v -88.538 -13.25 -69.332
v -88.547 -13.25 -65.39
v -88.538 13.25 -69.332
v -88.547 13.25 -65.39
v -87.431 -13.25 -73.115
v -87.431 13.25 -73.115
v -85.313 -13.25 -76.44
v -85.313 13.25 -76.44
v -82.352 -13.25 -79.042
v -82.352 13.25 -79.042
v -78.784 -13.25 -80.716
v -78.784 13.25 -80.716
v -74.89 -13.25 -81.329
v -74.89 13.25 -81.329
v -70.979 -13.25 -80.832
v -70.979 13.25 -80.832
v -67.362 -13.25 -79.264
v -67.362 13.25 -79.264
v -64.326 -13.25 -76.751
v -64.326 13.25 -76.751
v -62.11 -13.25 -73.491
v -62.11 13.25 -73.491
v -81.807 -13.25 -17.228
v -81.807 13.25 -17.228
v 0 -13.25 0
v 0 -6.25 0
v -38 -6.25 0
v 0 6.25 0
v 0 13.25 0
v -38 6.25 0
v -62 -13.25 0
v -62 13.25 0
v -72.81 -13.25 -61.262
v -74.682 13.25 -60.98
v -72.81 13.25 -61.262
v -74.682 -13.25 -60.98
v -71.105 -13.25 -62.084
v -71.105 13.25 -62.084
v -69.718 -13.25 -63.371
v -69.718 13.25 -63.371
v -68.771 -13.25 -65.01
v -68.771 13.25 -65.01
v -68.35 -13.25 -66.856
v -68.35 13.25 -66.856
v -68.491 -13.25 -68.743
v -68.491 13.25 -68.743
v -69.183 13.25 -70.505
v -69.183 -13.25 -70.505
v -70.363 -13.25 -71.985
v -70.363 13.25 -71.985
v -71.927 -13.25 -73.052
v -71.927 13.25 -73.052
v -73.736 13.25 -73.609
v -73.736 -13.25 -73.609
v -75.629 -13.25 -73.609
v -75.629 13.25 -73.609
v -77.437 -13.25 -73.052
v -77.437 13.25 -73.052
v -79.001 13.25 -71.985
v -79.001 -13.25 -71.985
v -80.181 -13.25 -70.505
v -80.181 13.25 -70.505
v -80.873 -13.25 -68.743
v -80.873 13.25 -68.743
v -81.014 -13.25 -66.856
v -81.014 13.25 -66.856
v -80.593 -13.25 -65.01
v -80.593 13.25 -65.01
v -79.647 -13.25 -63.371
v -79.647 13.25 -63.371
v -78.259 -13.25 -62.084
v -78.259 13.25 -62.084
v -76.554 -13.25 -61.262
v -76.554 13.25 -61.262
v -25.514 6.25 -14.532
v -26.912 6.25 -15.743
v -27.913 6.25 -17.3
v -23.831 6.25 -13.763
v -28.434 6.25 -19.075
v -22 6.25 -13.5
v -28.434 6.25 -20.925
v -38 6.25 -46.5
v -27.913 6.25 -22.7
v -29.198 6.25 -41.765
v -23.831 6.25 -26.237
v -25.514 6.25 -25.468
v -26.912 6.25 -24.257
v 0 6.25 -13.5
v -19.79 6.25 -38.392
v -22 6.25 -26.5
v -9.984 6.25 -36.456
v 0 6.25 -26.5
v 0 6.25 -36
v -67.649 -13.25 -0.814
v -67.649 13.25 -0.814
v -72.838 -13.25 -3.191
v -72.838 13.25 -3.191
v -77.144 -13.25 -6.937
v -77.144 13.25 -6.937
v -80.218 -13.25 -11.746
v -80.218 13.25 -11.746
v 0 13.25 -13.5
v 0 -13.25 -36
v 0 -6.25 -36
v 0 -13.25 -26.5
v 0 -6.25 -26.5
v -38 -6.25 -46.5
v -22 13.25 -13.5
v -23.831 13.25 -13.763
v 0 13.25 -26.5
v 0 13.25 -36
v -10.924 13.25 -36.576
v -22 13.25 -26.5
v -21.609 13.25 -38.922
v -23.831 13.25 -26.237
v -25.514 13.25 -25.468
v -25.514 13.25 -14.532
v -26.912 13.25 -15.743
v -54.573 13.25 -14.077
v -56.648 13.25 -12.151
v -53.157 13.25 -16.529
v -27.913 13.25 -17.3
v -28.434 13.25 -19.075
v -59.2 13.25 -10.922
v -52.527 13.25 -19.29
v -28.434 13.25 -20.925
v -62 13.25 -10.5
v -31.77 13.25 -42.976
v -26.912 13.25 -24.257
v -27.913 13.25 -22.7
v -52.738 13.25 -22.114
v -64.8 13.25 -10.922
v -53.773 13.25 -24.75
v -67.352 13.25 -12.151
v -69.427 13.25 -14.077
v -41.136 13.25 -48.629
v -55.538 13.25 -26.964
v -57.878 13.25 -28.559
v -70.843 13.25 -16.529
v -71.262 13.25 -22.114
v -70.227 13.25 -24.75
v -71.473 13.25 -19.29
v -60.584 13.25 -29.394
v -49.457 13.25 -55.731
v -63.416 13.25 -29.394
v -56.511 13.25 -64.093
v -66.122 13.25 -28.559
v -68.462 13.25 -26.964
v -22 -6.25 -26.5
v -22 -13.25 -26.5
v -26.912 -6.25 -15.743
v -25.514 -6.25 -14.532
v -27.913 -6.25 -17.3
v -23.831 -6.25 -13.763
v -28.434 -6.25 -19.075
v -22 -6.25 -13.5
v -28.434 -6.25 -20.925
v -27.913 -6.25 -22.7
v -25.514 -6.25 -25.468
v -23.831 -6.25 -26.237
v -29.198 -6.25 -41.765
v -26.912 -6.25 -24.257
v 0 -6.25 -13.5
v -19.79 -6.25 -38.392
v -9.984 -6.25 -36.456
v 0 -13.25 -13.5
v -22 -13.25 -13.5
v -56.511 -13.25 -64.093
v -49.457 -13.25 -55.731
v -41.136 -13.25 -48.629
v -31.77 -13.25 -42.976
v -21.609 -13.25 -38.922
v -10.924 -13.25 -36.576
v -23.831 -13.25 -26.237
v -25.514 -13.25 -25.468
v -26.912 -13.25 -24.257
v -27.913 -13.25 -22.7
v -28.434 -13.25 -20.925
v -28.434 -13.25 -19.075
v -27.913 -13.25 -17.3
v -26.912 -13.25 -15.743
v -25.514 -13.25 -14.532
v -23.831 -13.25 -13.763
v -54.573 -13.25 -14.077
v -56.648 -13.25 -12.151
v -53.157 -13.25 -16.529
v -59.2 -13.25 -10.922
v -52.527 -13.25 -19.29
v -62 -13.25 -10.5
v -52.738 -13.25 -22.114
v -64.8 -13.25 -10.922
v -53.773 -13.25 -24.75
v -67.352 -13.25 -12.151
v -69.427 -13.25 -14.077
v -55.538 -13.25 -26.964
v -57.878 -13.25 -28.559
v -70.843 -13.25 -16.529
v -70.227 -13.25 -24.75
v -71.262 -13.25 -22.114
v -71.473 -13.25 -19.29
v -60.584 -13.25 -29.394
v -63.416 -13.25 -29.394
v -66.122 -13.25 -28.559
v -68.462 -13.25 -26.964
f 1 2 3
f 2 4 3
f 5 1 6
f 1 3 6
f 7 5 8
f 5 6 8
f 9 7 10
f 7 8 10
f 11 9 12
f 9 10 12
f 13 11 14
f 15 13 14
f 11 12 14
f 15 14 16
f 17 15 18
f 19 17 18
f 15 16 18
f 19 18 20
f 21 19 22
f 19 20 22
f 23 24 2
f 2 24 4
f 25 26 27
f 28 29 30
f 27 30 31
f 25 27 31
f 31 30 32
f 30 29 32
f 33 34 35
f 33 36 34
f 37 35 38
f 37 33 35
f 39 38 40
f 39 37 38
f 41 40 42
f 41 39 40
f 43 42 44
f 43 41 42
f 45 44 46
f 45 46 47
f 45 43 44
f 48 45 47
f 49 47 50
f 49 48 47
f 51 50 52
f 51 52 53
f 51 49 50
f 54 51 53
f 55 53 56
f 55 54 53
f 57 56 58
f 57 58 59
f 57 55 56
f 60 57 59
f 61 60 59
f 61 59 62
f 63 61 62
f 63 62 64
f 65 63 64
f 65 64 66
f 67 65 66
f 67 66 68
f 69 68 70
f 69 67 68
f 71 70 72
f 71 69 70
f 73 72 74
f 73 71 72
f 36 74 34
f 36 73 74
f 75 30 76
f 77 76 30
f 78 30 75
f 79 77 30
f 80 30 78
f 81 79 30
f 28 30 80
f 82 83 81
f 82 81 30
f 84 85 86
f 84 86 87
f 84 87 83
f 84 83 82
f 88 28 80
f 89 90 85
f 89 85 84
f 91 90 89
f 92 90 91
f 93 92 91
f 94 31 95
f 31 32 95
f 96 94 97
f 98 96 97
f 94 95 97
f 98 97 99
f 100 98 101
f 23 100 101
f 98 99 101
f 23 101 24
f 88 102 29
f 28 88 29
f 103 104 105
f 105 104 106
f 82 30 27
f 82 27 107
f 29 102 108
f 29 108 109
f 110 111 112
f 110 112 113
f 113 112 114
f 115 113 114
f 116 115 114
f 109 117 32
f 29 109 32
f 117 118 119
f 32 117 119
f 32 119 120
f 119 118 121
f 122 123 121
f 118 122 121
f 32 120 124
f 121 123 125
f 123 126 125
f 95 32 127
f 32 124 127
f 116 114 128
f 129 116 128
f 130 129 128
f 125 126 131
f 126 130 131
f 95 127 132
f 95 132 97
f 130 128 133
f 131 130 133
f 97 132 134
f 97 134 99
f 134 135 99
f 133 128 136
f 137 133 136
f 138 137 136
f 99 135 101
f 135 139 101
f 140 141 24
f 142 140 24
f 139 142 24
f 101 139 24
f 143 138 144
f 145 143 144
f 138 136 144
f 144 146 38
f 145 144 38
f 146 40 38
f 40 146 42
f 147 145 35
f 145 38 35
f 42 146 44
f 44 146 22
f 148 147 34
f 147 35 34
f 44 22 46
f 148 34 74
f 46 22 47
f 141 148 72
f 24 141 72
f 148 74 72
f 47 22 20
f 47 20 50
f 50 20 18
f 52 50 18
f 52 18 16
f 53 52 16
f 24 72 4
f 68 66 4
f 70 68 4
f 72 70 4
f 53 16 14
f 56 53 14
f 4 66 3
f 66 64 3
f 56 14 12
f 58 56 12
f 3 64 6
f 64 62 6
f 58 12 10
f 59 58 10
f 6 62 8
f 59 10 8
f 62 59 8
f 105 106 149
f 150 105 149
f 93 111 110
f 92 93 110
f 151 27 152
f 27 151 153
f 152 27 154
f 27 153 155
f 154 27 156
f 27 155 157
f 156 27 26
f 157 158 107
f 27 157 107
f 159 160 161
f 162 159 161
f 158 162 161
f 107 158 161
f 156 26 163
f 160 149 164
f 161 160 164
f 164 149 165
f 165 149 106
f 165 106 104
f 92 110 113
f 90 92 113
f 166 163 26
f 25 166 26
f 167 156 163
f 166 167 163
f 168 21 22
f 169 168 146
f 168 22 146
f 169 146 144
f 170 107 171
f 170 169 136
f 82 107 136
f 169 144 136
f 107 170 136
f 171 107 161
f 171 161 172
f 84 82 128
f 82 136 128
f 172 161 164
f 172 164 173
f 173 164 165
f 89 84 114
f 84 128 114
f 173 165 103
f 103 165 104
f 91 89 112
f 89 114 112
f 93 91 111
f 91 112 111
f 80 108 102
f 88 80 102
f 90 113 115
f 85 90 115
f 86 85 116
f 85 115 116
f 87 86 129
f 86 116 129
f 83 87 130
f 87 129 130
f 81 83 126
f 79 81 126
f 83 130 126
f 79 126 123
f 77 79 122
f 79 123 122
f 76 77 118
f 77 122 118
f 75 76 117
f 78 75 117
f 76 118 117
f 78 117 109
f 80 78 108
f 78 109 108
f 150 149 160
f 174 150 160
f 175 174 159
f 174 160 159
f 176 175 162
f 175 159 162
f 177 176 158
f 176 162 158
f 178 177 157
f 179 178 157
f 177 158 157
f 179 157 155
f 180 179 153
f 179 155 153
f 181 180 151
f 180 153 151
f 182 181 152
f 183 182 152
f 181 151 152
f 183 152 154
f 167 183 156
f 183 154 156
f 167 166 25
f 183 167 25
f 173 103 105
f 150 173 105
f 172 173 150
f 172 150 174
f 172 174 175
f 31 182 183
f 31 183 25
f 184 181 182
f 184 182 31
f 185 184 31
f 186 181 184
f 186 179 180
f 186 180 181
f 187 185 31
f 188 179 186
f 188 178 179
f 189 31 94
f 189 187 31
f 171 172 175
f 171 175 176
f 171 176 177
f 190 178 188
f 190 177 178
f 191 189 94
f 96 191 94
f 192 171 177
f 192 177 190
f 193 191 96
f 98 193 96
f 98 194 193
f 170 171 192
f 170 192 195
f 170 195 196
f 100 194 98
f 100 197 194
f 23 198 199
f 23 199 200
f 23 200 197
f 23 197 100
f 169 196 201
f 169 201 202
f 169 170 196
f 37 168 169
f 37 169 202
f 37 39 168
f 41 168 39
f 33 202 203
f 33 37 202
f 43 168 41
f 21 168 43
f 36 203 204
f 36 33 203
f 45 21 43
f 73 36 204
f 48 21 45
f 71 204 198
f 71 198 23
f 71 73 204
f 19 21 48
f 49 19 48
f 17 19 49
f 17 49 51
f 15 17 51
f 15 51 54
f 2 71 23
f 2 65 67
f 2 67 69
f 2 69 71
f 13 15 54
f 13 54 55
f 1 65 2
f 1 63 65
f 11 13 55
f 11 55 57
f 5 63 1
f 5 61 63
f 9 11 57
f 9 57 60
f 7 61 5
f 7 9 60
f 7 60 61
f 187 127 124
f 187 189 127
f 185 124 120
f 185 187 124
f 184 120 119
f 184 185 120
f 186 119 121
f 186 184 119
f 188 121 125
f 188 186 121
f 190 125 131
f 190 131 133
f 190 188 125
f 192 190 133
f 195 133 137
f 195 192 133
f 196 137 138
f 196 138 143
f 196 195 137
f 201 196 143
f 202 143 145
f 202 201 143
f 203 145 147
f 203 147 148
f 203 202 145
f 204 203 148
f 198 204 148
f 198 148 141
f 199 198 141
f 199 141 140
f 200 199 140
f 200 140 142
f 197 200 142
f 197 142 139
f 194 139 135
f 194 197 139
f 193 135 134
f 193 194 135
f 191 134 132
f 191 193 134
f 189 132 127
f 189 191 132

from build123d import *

# Parameters (mm, degrees)
SKETCH1_R           = 9.5
SKETCH1_R_2         = 6.35
BOSS_EXTRUDE1_DEPTH = 13.25
SKETCH2_W           = 73.338944958
SKETCH2_H           = 12.5
CUT_EXTRUDE3_DEPTH  = 38


with BuildPart() as part:
    # Sketch1 → Boss-Extrude1 (new, symmetric)
    with BuildSketch(Plane(origin=(0, 0, 0), x_dir=(1, 0, 0), z_dir=(0, 1, 0))):
        with BuildLine():
            Line((0, 0), (-62, 0))
            ThreePointArc((-62, 0), (-75.125587601, 4.90964049), (-81.806983567, 17.228104986))
            Line((-81.806983567, 17.228104986), (-88.547021707, 65.390038979))
            ThreePointArc((-88.547021707, 65.390038979), (-78.78369233, 80.716074763), (-62.110282709, 73.49060696))
            ThreePointArc((-62.110282709, 73.49060696), (-36.56849942, 45.611382856), (0, 36))
            Line((0, 36), (0, 26.5))
            Line((0, 26.5), (-22, 26.5))
            ThreePointArc((-22, 26.5), (-28.5, 20), (-22, 13.5))
            Line((-22, 13.5), (0, 13.5))
            Line((0, 13.5), (0, 0))
        make_face()
        with Locations(Location((-62, 20, 0), (0, 0, 270))):
            Circle(SKETCH1_R, mode=Mode.SUBTRACT)
        with Locations(Location((-74.68213321, 67.330365488, 0), (0, 0, 270))):
            Circle(SKETCH1_R_2, mode=Mode.SUBTRACT)
    extrude(amount=BOSS_EXTRUDE1_DEPTH, both=True)

    # Sketch2 → Cut-Extrude3 (cut)
    with BuildSketch(Plane(origin=(0, 0, 0), x_dir=(0, 0, -1), z_dir=(1, 0, 0))):
        with Locations((36.669472479, 0)):
            Rectangle(SKETCH2_W, SKETCH2_H)
    extrude(amount=-CUT_EXTRUDE3_DEPTH, mode=Mode.SUBTRACT)


solid = part.part
